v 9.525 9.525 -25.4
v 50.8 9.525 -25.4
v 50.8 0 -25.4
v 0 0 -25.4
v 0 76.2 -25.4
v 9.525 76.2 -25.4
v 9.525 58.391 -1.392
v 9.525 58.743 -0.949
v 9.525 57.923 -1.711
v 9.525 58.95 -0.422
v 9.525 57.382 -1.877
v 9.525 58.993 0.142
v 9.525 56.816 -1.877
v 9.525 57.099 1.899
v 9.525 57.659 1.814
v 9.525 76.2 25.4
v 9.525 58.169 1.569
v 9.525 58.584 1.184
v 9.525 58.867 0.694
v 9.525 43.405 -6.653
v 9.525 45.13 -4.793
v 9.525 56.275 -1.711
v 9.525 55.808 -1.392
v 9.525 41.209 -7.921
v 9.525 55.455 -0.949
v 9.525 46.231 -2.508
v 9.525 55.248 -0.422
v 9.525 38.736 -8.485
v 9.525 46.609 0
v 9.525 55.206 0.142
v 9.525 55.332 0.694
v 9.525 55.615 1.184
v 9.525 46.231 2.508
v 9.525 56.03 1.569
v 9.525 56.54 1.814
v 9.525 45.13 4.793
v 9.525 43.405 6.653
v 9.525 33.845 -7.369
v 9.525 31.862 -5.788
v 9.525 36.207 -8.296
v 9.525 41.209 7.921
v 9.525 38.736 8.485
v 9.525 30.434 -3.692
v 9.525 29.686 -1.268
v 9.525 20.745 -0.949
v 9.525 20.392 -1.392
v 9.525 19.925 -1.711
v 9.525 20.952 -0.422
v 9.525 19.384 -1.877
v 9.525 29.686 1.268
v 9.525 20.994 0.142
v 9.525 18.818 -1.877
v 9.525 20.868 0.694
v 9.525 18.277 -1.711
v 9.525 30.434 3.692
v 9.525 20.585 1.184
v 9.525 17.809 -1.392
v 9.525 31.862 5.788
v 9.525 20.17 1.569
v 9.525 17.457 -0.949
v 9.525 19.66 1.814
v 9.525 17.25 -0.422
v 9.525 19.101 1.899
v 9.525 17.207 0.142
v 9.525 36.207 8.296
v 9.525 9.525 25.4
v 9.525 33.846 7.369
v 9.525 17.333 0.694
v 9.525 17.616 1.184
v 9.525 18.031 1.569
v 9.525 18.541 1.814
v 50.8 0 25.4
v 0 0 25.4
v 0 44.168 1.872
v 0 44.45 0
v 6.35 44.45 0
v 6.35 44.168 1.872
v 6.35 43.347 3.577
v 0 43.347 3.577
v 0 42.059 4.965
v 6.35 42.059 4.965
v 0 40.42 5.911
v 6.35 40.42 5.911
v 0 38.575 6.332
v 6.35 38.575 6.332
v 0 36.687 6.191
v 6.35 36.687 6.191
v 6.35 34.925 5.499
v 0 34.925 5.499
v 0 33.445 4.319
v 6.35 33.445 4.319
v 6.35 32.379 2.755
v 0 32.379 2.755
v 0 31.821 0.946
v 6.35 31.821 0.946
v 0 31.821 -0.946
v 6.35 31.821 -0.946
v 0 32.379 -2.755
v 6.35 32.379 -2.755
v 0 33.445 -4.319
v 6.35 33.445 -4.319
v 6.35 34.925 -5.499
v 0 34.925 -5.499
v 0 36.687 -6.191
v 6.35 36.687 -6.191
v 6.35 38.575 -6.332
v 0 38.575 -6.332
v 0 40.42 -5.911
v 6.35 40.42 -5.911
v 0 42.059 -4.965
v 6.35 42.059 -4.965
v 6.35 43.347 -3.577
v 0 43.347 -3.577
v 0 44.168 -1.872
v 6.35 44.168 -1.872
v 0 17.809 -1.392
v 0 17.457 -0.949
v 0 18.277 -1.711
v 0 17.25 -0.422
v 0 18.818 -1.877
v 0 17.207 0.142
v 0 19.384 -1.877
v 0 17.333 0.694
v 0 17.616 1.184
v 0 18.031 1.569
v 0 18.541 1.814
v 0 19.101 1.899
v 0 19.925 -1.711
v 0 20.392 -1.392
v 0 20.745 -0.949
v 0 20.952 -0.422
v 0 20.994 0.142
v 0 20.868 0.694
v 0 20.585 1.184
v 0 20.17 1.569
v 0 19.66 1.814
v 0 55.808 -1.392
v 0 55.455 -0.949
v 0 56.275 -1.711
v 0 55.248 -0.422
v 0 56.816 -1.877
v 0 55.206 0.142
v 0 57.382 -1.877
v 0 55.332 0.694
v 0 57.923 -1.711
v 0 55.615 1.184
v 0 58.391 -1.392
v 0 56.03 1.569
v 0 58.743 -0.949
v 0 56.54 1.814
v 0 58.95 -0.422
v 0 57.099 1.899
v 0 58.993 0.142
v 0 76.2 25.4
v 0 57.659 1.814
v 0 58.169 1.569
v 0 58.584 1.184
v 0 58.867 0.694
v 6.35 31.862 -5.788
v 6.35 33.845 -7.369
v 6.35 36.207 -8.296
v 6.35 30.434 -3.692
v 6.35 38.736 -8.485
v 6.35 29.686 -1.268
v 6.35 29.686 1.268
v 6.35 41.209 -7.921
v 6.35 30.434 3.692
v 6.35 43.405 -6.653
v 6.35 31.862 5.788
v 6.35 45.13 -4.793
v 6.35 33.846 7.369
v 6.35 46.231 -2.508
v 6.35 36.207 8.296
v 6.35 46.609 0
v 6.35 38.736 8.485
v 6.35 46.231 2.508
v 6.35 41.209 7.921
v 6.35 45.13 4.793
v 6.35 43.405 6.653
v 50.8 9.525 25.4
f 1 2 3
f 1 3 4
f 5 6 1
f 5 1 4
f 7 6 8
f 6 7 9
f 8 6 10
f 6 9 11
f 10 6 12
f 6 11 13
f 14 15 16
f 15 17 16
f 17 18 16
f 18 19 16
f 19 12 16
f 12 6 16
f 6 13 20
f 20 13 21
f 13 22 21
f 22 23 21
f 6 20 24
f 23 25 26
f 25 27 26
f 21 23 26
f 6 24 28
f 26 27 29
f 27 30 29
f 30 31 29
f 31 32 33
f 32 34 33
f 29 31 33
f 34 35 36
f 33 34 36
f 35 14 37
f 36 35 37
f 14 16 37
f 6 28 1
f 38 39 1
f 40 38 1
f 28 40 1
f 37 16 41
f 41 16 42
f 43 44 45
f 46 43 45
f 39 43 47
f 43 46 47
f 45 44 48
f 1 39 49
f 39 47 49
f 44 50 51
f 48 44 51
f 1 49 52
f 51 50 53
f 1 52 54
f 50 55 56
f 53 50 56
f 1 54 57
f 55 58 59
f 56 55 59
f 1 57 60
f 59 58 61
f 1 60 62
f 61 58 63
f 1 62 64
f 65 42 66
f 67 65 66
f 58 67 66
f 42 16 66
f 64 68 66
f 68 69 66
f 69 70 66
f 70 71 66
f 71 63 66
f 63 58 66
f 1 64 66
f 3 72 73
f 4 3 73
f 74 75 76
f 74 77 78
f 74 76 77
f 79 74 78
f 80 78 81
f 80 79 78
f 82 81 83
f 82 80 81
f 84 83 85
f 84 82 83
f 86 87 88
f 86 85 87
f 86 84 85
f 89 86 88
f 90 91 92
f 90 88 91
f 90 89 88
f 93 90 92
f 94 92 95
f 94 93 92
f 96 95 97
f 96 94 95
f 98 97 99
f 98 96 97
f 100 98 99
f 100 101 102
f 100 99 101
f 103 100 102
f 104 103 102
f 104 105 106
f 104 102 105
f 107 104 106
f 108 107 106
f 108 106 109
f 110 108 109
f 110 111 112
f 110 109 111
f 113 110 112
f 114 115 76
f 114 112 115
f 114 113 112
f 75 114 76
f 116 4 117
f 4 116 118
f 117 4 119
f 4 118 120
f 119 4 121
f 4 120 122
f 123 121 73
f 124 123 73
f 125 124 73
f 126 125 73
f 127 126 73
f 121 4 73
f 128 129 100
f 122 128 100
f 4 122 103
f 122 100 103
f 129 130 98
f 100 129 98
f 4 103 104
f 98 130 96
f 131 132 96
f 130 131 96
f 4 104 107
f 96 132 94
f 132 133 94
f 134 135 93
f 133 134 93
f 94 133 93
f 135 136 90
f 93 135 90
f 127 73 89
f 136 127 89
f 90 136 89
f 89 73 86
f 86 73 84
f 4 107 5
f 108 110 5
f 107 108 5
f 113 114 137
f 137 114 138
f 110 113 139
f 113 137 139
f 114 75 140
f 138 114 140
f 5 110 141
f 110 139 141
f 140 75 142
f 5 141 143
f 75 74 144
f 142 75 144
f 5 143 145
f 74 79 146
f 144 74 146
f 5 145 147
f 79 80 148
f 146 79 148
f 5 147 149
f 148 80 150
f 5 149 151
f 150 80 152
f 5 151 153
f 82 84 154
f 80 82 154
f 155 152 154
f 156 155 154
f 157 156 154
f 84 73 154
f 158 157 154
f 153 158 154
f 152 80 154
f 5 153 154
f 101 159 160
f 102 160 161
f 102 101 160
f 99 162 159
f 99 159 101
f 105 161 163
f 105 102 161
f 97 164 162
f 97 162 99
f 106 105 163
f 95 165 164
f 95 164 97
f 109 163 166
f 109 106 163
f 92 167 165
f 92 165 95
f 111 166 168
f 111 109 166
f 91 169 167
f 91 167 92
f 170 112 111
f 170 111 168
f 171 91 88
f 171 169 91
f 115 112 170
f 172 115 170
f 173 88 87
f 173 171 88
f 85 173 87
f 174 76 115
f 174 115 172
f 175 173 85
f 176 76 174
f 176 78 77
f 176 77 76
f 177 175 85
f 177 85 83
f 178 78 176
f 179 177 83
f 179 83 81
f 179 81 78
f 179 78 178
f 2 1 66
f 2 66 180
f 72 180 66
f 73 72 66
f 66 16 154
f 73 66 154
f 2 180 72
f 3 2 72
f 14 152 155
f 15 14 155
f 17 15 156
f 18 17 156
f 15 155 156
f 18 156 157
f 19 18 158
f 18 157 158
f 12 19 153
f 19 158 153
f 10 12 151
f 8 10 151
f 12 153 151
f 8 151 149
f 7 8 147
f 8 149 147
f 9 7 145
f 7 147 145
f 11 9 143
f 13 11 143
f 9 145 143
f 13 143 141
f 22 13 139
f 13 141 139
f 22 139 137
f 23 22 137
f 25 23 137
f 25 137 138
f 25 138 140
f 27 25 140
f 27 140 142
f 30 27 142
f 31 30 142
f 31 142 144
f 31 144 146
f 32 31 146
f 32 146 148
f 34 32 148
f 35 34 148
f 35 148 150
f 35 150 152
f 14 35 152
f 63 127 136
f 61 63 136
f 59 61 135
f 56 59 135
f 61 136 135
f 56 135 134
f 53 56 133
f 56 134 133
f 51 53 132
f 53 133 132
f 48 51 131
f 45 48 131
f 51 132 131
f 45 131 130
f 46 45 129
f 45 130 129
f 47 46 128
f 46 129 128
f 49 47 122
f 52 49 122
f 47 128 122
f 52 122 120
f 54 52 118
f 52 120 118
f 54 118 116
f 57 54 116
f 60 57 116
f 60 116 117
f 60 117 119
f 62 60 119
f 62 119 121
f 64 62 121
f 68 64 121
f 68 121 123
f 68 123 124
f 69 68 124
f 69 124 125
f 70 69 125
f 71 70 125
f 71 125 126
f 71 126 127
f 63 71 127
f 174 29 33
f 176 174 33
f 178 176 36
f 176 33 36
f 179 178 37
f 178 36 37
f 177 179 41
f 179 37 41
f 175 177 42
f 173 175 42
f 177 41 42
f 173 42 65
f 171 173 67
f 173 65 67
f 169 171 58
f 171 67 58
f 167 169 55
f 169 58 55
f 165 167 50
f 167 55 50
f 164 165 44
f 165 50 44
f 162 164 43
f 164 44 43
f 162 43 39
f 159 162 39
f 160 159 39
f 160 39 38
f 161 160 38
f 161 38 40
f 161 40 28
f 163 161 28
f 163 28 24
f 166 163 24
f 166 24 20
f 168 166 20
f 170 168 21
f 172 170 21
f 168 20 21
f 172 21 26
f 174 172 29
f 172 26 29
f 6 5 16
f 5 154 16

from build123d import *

# Parameters (mm, degrees)
BOSS_EXTRUDE1_DEPTH     = 25.4
SKETCH5_R               = 8.509
CUT_EXTRUDE1_DEPTH      = 3.175
CUT_EXTRUDE2_DEPTH      = 91.306287849
CUT_EXTRUDE2_DEPTH_BACK = 91.306287849
SKETCH6_R               = 6.35
F_10_24_TAPPED_HOLE1_D  = 3.7973


with BuildPart() as part:
    # Sketch2 → Boss-Extrude1 (new, symmetric)
    with BuildSketch(Plane.XY):
        Polygon((0, 0), (0, 76.2), (9.525, 76.2), (9.525, 9.525), (50.8, 9.525), (50.8, 0), align=None)
    extrude(amount=BOSS_EXTRUDE1_DEPTH, both=True)

    # Sketch5 → Cut-Extrude1 (cut)
    with BuildSketch(Plane(origin=(9.525, 0, 0), x_dir=(0, 0, -1), z_dir=(1, 0, 0))):
        with Locations(Location((0, 38.1, 0), (0, 0, 90))):
            Circle(SKETCH5_R)
    extrude(amount=-CUT_EXTRUDE1_DEPTH, mode=Mode.SUBTRACT)

    # Sketch6 → Cut-Extrude2 (cut, two sides: drawn at the far end of the back side and taken through both)
    with BuildSketch(Plane(origin=(9.525, 0, 0), x_dir=(0, 0, -1), z_dir=(1, 0, 0)).offset(-CUT_EXTRUDE2_DEPTH_BACK)):
        with Locations(Location((0, 38.1, 0), (0, 0, 90))):
            Circle(SKETCH6_R)
    extrude(amount=CUT_EXTRUDE2_DEPTH + CUT_EXTRUDE2_DEPTH_BACK, mode=Mode.SUBTRACT)

    # #10-24 Tapped Hole1 (through all)
    with Locations(Plane(origin=(9.525, 0, 0), x_dir=(0, 0, -1), z_dir=(1, 0, 0))):
        with Locations((0, 57.0992), (0, 19.1008)):
            Hole(F_10_24_TAPPED_HOLE1_D / 2)


solid = part.part
